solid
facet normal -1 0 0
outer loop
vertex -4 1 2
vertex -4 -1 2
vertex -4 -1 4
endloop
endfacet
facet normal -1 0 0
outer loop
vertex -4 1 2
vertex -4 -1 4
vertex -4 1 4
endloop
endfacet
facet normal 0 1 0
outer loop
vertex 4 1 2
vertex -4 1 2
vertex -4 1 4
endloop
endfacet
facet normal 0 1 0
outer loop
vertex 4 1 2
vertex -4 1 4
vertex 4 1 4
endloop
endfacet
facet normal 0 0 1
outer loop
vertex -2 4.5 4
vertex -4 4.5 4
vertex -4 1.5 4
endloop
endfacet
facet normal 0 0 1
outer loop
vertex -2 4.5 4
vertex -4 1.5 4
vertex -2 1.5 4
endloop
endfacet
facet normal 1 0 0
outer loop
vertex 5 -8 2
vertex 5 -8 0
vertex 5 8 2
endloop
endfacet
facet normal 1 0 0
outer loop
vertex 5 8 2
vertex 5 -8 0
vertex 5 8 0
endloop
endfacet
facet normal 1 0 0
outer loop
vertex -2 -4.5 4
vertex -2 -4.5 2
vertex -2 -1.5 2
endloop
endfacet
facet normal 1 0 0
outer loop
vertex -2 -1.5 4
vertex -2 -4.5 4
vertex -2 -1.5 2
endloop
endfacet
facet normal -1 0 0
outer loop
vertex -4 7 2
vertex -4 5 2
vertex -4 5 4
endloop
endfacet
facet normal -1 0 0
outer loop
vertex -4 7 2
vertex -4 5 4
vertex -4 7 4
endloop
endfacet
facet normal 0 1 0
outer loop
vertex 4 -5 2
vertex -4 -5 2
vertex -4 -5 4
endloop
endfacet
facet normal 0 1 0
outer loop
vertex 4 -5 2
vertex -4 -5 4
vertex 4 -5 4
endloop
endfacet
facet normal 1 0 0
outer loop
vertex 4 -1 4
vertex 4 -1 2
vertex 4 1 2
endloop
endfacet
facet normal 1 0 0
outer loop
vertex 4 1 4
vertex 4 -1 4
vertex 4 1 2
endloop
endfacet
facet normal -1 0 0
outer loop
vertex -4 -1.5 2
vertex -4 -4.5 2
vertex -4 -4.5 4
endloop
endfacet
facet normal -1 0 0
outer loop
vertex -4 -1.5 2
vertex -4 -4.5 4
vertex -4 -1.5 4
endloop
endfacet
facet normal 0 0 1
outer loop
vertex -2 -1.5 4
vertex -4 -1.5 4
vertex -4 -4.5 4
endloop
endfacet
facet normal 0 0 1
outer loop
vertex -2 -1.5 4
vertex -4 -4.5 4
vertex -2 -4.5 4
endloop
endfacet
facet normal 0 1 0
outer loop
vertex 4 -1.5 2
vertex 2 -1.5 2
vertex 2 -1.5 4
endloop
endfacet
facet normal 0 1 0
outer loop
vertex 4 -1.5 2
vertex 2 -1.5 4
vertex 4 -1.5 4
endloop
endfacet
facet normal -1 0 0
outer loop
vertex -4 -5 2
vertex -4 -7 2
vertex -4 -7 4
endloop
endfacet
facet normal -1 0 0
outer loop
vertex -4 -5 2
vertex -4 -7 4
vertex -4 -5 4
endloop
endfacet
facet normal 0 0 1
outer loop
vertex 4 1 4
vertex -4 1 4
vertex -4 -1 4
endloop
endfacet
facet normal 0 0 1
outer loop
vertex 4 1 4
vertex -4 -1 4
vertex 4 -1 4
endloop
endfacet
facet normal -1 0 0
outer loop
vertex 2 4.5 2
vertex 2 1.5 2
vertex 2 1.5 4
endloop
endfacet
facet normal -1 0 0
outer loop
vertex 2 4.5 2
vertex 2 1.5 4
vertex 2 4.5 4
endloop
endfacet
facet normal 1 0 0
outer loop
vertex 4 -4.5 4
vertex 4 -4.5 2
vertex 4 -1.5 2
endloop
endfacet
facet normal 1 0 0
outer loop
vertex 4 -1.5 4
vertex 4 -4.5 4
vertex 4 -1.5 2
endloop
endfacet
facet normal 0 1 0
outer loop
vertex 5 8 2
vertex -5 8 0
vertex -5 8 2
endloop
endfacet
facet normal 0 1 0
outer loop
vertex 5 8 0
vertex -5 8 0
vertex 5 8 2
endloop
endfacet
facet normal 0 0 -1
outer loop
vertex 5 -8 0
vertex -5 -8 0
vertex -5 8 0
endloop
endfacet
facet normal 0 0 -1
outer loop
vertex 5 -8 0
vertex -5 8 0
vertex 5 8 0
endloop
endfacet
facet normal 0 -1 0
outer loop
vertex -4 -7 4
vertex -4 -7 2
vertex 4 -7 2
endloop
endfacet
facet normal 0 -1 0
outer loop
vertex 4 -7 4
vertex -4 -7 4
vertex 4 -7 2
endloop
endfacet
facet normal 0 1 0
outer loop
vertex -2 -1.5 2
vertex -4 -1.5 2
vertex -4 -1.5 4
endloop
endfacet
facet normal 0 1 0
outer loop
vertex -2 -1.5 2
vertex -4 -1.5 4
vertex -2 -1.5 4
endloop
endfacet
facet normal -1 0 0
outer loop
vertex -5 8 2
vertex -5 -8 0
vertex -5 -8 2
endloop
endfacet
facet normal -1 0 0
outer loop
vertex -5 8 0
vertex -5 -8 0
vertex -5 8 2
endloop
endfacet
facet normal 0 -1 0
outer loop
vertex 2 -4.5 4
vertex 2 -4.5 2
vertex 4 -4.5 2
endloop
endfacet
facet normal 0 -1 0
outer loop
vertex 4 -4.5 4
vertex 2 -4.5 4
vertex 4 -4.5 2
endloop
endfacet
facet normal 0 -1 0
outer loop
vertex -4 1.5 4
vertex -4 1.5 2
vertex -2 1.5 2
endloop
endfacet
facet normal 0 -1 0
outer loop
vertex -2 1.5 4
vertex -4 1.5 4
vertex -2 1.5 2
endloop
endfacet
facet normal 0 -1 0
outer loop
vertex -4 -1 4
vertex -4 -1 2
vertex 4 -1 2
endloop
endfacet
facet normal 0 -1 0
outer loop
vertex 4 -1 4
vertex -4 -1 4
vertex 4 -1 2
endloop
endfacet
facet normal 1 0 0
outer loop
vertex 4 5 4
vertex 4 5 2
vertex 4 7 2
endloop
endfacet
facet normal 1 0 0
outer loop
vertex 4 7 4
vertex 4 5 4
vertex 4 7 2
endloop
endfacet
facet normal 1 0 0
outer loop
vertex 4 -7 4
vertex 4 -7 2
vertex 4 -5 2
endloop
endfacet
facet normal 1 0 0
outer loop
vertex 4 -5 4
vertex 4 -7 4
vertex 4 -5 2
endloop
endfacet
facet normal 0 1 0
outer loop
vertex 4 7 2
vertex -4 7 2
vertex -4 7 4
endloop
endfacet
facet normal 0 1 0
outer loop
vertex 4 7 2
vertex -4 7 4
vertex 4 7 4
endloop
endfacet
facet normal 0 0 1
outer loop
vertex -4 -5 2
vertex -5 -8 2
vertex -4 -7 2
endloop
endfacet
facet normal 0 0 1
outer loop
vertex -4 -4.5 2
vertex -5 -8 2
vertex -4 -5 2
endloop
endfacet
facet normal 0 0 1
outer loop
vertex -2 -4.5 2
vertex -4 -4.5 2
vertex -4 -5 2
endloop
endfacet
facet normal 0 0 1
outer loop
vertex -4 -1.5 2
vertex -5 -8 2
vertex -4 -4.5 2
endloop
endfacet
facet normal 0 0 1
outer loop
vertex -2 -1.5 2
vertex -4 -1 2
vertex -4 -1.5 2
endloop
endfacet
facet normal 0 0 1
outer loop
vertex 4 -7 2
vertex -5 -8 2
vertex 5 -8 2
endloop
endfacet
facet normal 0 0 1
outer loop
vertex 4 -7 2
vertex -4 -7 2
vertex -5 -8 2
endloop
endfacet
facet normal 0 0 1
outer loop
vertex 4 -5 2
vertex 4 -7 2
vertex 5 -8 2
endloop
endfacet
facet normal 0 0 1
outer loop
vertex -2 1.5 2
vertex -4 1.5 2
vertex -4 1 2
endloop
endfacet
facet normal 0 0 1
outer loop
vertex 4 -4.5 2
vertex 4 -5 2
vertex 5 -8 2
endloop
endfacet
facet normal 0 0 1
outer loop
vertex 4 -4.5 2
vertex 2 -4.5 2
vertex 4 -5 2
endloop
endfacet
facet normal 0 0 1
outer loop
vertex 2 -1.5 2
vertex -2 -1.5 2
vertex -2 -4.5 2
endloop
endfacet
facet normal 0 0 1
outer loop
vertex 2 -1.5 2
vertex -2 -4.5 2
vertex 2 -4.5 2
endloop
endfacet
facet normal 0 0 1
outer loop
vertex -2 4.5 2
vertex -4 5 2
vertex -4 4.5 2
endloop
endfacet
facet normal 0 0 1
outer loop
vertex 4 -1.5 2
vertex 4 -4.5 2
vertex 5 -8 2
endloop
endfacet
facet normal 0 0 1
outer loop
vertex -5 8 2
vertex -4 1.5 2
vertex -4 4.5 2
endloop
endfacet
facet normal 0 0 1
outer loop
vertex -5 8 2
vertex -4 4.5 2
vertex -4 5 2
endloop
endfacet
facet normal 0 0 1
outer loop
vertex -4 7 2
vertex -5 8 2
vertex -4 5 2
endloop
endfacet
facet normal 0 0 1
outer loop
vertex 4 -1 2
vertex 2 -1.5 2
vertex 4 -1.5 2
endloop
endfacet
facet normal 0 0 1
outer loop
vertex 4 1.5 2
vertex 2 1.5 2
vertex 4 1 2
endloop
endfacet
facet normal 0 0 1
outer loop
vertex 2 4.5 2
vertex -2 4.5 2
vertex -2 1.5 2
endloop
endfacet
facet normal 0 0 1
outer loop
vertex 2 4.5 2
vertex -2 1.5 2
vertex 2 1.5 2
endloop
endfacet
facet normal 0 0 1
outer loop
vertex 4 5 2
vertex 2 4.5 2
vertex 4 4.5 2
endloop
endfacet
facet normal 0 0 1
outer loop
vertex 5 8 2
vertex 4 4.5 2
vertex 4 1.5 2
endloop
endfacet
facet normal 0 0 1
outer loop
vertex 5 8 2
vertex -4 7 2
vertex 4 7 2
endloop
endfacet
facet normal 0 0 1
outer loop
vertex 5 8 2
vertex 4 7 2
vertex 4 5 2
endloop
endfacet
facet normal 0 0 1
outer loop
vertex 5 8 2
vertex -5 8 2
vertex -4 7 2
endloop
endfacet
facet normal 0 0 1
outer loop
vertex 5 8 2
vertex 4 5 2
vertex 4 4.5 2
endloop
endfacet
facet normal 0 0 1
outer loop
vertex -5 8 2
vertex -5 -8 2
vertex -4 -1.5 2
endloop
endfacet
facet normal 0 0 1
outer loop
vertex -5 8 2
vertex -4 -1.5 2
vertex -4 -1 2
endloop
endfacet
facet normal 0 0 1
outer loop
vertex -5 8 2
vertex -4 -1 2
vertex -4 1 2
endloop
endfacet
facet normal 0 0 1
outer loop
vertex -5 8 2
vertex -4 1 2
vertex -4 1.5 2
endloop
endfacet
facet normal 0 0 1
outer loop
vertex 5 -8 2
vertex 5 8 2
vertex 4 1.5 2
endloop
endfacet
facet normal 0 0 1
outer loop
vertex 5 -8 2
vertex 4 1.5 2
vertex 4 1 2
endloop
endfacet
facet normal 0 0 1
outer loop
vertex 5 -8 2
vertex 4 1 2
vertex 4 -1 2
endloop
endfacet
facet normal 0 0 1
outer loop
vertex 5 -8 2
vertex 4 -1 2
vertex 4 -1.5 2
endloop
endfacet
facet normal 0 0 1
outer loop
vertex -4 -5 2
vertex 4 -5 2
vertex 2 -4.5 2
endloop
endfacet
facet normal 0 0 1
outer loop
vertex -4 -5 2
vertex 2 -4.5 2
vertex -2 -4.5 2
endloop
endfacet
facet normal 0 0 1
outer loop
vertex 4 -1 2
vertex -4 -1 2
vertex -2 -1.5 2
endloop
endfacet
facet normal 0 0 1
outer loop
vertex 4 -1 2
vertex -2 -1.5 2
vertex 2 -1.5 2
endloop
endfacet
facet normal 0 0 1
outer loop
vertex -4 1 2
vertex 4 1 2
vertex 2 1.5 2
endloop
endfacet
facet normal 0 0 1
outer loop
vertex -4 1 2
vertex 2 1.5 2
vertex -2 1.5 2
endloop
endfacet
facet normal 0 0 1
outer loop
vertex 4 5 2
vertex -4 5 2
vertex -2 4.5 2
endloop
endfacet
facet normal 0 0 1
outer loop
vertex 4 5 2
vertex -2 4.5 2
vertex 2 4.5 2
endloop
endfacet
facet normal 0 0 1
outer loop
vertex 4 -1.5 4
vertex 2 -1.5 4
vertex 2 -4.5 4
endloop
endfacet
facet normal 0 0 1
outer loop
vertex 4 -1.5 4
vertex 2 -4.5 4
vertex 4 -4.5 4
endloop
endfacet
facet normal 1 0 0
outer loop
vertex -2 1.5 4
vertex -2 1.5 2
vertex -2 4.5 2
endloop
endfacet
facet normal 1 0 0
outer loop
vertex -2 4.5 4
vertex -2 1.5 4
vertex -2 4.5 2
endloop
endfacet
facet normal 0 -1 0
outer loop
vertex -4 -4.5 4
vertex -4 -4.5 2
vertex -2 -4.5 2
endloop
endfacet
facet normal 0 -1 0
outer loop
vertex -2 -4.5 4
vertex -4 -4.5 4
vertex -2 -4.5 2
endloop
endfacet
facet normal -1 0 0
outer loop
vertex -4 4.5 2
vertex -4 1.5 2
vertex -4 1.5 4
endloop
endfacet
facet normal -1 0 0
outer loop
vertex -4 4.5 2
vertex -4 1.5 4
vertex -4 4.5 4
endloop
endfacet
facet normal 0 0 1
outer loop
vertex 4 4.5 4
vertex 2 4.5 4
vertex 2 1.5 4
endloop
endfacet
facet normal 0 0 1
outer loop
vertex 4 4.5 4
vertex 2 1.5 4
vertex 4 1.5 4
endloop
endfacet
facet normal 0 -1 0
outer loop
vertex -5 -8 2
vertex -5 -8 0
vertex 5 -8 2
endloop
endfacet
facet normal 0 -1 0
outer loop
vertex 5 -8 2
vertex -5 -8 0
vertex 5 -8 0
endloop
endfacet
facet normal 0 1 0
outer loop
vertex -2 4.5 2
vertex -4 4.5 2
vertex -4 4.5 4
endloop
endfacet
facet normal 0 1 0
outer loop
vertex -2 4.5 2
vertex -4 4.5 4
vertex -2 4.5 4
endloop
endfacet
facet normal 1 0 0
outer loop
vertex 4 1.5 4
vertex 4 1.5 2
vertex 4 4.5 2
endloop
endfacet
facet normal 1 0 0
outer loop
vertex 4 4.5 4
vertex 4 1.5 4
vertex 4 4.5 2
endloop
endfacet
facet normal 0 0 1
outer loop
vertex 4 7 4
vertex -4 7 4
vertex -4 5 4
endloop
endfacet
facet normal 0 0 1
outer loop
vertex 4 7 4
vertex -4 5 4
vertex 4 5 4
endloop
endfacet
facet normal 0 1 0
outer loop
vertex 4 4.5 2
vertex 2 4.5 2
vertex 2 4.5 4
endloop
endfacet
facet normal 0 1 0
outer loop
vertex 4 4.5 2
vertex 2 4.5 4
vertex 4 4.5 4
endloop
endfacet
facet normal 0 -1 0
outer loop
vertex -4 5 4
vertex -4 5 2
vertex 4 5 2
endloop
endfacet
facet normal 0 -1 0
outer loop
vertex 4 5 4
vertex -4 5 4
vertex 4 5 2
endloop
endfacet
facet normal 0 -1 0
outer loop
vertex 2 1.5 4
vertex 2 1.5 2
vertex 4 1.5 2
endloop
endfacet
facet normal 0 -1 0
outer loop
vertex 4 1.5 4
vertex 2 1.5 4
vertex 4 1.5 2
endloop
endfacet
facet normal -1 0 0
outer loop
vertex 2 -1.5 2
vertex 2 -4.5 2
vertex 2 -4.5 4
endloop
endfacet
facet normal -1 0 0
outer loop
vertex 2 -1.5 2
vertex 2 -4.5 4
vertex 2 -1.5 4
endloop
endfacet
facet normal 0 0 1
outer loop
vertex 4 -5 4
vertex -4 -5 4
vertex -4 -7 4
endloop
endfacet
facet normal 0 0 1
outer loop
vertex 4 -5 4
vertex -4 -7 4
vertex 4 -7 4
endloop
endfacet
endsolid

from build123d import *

# Parameters (mm, degrees)
F0_W     = 10
F0_H     = 16
F1_DEPTH = 2
F2_W     = 8
F2_H     = 2
F2_W_2   = 2
F2_H_2   = 3
F3_DEPTH = 2


with BuildPart() as f1:
    # F0 (on Top) → F1 (new body)
    with BuildSketch(Plane.XY):
        Rectangle(F0_W, F0_H)
    extrude(amount=F1_DEPTH)

    # F2 (on face) → F3 (join)
    with BuildSketch(Plane.XY.offset(2)):
        Rectangle(F2_W, F2_H)
        with Locations((0, -6)):
            Rectangle(F2_W, F2_H)
        with Locations((-3, 3)):
            Rectangle(F2_W_2, F2_H_2)
        with Locations((3, 3)):
            Rectangle(F2_W_2, F2_H_2)
        with Locations((-3, -3)):
            Rectangle(F2_W_2, F2_H_2)
        with Locations((3, -3)):
            Rectangle(F2_W_2, F2_H_2)
        with Locations((0, 6)):
            Rectangle(F2_W, F2_H)
    extrude(amount=F3_DEPTH)


solid = f1.part
